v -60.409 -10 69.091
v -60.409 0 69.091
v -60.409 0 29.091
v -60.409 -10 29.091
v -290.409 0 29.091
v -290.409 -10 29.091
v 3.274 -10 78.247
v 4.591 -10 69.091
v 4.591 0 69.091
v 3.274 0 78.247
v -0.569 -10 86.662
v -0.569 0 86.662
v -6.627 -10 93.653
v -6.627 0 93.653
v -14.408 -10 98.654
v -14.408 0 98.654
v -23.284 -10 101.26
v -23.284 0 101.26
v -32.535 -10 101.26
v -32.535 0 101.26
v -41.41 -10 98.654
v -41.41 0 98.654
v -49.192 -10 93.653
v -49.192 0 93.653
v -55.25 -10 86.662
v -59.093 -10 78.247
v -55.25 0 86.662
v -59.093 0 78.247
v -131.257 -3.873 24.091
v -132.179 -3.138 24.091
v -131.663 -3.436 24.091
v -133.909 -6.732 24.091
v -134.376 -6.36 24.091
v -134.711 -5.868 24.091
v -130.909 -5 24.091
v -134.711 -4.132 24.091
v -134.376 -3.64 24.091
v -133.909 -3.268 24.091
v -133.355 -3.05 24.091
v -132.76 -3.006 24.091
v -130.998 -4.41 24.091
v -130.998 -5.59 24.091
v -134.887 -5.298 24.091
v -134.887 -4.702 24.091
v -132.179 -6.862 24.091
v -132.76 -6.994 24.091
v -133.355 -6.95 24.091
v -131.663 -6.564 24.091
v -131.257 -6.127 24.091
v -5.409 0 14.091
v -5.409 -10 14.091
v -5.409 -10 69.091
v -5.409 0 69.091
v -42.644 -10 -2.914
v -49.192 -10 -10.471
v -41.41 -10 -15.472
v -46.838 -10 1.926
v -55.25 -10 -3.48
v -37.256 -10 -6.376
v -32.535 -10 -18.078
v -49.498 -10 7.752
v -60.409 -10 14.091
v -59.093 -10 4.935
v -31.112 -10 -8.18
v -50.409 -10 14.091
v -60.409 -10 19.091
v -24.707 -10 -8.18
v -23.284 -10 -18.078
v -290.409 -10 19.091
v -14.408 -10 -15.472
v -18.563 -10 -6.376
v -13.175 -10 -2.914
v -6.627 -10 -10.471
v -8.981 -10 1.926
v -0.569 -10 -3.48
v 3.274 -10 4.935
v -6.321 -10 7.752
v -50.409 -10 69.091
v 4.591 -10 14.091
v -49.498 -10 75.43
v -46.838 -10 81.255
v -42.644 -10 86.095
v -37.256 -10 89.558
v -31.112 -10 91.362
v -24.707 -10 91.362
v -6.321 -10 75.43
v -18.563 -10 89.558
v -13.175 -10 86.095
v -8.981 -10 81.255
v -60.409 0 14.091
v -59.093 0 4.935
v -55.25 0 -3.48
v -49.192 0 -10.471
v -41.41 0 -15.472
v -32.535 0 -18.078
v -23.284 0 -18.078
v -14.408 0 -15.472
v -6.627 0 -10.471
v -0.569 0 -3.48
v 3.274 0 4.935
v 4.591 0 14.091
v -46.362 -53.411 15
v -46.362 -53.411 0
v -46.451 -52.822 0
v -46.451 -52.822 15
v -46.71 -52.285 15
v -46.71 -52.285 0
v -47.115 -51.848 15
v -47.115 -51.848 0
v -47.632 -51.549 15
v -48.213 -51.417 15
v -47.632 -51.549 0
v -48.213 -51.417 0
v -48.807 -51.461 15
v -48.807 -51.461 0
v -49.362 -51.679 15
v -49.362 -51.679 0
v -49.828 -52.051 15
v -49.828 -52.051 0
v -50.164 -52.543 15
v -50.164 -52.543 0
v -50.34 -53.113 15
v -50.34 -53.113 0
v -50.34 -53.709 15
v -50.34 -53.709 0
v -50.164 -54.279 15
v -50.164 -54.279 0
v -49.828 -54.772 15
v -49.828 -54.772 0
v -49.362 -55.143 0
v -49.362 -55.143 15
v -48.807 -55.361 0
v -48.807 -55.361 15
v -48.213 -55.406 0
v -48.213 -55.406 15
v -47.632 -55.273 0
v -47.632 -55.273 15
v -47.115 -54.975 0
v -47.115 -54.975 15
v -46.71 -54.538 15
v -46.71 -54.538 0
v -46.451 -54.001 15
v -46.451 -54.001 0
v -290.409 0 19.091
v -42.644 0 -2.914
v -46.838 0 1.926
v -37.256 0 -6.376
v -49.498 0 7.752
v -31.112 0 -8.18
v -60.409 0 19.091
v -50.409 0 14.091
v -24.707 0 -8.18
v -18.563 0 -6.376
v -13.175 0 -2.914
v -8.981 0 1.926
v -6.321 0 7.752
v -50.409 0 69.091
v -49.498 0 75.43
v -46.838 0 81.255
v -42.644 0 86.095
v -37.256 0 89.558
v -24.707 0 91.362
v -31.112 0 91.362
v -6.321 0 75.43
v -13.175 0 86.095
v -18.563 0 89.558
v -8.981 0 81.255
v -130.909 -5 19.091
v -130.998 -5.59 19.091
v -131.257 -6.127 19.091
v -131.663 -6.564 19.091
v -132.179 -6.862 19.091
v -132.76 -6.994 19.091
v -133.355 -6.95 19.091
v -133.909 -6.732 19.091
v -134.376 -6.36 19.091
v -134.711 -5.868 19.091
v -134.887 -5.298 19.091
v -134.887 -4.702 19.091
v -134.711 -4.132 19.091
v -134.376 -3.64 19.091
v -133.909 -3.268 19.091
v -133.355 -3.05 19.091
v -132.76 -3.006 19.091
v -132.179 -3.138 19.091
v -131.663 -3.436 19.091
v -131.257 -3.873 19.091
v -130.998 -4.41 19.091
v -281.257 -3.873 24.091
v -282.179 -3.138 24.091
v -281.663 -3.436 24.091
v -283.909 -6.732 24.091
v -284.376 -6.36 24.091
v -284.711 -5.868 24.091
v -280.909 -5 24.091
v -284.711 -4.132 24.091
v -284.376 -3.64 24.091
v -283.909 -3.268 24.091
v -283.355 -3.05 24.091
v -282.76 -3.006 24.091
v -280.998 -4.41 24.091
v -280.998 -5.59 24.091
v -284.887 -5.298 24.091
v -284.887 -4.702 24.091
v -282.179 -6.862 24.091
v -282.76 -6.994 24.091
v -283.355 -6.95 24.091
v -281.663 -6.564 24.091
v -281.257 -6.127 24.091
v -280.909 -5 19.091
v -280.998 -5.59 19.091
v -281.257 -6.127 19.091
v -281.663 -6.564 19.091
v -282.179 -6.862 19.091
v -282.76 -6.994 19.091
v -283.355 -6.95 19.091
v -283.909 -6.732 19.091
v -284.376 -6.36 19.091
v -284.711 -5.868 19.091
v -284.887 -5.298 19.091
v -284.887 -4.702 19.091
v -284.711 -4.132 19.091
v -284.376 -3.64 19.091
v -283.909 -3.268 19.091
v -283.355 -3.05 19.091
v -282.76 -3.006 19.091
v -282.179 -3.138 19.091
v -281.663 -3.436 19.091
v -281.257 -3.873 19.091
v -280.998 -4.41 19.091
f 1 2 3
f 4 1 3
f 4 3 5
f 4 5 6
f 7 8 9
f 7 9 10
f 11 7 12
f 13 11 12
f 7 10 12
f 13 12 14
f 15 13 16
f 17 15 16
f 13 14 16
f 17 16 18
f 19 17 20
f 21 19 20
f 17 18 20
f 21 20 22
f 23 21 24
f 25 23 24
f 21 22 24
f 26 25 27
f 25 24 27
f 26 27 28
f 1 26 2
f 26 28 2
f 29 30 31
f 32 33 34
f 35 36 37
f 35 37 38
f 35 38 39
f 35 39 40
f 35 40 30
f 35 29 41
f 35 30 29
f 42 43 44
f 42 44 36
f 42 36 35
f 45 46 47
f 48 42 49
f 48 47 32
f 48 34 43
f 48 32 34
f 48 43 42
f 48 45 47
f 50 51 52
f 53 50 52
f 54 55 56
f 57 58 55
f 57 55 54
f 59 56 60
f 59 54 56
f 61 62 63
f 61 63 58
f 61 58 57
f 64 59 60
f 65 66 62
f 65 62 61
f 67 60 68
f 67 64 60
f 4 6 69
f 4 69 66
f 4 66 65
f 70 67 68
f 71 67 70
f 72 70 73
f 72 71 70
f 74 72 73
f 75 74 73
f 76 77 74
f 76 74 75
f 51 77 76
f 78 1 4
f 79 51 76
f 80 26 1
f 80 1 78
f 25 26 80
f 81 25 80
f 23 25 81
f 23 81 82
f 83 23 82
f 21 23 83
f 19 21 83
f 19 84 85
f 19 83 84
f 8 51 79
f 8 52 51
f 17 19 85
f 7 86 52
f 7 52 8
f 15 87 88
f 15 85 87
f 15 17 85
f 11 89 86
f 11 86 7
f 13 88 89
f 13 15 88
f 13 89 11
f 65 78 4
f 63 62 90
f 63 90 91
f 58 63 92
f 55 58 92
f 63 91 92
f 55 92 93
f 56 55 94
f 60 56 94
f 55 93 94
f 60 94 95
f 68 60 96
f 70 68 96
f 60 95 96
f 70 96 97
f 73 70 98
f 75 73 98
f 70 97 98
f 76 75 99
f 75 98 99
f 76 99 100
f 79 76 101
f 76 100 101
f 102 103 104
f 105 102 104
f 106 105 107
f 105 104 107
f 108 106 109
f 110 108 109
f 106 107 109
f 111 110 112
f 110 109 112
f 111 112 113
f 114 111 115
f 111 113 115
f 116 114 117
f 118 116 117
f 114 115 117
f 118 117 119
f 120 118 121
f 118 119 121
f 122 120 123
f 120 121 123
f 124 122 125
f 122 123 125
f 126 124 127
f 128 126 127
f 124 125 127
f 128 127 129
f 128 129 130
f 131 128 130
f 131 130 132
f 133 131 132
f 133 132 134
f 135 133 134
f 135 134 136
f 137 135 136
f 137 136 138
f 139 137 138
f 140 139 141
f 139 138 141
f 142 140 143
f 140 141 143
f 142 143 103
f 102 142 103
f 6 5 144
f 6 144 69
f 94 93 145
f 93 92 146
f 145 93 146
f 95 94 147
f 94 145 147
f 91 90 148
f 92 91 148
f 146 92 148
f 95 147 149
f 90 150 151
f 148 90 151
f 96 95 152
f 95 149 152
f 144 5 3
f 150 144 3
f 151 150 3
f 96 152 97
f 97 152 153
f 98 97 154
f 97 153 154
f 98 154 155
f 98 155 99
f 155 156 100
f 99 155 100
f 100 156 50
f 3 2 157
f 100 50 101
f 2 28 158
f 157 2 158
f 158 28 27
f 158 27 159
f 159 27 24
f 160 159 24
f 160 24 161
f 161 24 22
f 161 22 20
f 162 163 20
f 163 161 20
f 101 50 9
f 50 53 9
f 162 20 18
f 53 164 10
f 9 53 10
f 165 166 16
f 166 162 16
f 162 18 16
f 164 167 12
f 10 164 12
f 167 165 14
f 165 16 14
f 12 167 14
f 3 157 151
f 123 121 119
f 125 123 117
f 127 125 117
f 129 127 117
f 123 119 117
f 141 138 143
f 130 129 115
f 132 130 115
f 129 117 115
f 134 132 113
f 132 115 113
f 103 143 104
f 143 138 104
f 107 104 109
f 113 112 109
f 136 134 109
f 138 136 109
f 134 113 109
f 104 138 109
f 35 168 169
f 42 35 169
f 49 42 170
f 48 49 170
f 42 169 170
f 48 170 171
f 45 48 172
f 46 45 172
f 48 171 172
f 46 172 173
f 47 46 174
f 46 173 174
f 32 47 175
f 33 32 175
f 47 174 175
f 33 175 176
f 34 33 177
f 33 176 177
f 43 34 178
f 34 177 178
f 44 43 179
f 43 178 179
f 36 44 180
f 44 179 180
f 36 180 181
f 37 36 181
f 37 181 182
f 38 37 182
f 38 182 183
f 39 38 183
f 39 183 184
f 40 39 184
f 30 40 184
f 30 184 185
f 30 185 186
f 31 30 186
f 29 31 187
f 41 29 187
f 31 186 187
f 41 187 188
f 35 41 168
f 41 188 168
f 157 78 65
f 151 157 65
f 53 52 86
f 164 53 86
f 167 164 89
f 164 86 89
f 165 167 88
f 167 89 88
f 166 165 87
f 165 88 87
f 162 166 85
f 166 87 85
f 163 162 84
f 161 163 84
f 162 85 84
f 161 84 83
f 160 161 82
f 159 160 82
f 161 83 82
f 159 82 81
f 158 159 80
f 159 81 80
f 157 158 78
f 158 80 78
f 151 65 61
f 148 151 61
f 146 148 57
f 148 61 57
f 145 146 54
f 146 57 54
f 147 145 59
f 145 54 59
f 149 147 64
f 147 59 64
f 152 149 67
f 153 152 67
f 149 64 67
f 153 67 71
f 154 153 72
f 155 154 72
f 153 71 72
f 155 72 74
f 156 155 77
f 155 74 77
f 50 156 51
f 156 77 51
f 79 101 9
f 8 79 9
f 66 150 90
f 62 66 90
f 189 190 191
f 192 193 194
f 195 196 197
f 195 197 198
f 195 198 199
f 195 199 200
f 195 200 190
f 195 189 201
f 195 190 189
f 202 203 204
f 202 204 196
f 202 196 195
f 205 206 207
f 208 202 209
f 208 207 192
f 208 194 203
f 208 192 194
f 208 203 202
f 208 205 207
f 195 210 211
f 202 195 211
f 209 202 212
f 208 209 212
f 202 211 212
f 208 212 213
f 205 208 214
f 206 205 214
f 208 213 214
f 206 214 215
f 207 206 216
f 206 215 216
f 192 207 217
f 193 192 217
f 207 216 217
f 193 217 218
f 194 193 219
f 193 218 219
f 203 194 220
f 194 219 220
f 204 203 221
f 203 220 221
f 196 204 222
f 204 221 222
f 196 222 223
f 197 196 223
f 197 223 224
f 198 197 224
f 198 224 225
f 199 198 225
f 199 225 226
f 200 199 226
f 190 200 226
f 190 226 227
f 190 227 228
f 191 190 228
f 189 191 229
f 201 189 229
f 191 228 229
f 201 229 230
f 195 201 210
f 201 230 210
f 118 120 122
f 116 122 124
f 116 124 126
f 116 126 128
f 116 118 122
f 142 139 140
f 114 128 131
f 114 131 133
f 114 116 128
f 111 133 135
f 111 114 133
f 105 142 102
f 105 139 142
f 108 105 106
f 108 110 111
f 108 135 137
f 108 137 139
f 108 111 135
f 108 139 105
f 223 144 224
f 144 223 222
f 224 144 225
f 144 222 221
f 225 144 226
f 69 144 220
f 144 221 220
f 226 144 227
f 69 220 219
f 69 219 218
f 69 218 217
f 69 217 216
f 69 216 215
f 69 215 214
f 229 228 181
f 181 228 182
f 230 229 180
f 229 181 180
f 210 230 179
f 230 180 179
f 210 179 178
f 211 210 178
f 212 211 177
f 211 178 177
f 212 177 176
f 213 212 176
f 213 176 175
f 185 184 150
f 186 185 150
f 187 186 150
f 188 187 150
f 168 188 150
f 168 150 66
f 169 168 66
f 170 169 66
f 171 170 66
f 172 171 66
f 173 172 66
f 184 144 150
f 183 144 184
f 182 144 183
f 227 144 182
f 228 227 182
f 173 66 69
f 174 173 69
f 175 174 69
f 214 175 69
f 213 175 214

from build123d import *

# Parameters (mm, degrees)
F1_DEPTH = 10
F3_DEPTH = 10.001
F4_W     = 10
F4_H     = 10
F5_DEPTH = 230
F6_R     = 2
F7_DEPTH = 5
F8_R     = 2
F9_DEPTH = 15


with BuildPart() as f1:
    # F0 (on Front) → F1 (new body)
    with BuildSketch(Plane.XZ):
        with BuildLine():
            ThreePointArc((4.590516, 14.090832), (0.543693, 29.79646), (-10.588976, 41.590832))
            ThreePointArc((-10.588976, 41.590832), (0.543693, 53.385204), (4.590516, 69.090832))
            ThreePointArc((4.590516, 69.090832), (-27.909484, 101.590832), (-60.409484, 69.090832))
            ThreePointArc((-60.409484, 69.090832), (-56.36266, 53.385204), (-45.229992, 41.590832))
            ThreePointArc((-45.229992, 41.590832), (-56.36266, 29.79646), (-60.409484, 14.090832))
            ThreePointArc((-60.409484, 14.090832), (-27.909484, -18.409168), (4.590516, 14.090832))
        make_face()
        with BuildLine():
            ThreePointArc((4.590516, 69.090832), (0.543693, 53.385204), (-10.588976, 41.590832))
            ThreePointArc((-10.588976, 41.590832), (0.543693, 29.79646), (4.590516, 14.090832))
            Line((4.590516, 14.090832), (4.590516, 69.090832))
        make_face()
        with BuildLine():
            ThreePointArc((-45.229992, 41.590832), (-56.36266, 53.385204), (-60.409484, 69.090832))
            Line((-60.409484, 69.090832), (-60.409484, 14.090832))
            ThreePointArc((-60.409484, 14.090832), (-56.36266, 29.79646), (-45.229992, 41.590832))
        make_face()
    extrude(amount=F1_DEPTH)

    # F2 (on face) → F3 (cut, through all)
    with BuildSketch(Plane.XZ.offset(10)):
        with BuildLine():
            ThreePointArc((-5.409484, 69.090832), (-27.909484, 91.590832), (-50.409484, 69.090832))
            Line((-50.409484, 69.090832), (-50.409484, 14.090832))
            ThreePointArc((-50.409484, 14.090832), (-27.909484, -8.409168), (-5.409484, 14.090832))
            Line((-5.409484, 14.090832), (-5.409484, 69.090832))
        make_face()
    extrude(amount=-F3_DEPTH, mode=Mode.SUBTRACT)

    # F4 (on face) → F5 (join)
    with BuildSketch(Plane(origin=(-60.409484, 0, 0), x_dir=(0, -1, 0), z_dir=(-1, 0, 0))):
        with Locations((5, 24.090832)):
            Rectangle(F4_W, F4_H)
    extrude(amount=F5_DEPTH)

    # F6 (on face) → F7 (cut)
    with BuildSketch(Plane(origin=(0, 0, 19.090832), x_dir=(1, 0, 0), z_dir=(0, 0, -1))):
        with Locations((-132.909484, 5)):
            Circle(F6_R)
        with Locations((-282.909484, 5)):
            Circle(F6_R)
    extrude(amount=-F7_DEPTH, mode=Mode.SUBTRACT)


with BuildPart() as f9:
    # F8 (on Top) → F9 (new body)
    with BuildSketch(Plane.XY):
        with Locations((-48.362393, -53.411171)):
            Circle(F8_R)
    extrude(amount=F9_DEPTH)


solid = Compound([f1.part, f9.part])
